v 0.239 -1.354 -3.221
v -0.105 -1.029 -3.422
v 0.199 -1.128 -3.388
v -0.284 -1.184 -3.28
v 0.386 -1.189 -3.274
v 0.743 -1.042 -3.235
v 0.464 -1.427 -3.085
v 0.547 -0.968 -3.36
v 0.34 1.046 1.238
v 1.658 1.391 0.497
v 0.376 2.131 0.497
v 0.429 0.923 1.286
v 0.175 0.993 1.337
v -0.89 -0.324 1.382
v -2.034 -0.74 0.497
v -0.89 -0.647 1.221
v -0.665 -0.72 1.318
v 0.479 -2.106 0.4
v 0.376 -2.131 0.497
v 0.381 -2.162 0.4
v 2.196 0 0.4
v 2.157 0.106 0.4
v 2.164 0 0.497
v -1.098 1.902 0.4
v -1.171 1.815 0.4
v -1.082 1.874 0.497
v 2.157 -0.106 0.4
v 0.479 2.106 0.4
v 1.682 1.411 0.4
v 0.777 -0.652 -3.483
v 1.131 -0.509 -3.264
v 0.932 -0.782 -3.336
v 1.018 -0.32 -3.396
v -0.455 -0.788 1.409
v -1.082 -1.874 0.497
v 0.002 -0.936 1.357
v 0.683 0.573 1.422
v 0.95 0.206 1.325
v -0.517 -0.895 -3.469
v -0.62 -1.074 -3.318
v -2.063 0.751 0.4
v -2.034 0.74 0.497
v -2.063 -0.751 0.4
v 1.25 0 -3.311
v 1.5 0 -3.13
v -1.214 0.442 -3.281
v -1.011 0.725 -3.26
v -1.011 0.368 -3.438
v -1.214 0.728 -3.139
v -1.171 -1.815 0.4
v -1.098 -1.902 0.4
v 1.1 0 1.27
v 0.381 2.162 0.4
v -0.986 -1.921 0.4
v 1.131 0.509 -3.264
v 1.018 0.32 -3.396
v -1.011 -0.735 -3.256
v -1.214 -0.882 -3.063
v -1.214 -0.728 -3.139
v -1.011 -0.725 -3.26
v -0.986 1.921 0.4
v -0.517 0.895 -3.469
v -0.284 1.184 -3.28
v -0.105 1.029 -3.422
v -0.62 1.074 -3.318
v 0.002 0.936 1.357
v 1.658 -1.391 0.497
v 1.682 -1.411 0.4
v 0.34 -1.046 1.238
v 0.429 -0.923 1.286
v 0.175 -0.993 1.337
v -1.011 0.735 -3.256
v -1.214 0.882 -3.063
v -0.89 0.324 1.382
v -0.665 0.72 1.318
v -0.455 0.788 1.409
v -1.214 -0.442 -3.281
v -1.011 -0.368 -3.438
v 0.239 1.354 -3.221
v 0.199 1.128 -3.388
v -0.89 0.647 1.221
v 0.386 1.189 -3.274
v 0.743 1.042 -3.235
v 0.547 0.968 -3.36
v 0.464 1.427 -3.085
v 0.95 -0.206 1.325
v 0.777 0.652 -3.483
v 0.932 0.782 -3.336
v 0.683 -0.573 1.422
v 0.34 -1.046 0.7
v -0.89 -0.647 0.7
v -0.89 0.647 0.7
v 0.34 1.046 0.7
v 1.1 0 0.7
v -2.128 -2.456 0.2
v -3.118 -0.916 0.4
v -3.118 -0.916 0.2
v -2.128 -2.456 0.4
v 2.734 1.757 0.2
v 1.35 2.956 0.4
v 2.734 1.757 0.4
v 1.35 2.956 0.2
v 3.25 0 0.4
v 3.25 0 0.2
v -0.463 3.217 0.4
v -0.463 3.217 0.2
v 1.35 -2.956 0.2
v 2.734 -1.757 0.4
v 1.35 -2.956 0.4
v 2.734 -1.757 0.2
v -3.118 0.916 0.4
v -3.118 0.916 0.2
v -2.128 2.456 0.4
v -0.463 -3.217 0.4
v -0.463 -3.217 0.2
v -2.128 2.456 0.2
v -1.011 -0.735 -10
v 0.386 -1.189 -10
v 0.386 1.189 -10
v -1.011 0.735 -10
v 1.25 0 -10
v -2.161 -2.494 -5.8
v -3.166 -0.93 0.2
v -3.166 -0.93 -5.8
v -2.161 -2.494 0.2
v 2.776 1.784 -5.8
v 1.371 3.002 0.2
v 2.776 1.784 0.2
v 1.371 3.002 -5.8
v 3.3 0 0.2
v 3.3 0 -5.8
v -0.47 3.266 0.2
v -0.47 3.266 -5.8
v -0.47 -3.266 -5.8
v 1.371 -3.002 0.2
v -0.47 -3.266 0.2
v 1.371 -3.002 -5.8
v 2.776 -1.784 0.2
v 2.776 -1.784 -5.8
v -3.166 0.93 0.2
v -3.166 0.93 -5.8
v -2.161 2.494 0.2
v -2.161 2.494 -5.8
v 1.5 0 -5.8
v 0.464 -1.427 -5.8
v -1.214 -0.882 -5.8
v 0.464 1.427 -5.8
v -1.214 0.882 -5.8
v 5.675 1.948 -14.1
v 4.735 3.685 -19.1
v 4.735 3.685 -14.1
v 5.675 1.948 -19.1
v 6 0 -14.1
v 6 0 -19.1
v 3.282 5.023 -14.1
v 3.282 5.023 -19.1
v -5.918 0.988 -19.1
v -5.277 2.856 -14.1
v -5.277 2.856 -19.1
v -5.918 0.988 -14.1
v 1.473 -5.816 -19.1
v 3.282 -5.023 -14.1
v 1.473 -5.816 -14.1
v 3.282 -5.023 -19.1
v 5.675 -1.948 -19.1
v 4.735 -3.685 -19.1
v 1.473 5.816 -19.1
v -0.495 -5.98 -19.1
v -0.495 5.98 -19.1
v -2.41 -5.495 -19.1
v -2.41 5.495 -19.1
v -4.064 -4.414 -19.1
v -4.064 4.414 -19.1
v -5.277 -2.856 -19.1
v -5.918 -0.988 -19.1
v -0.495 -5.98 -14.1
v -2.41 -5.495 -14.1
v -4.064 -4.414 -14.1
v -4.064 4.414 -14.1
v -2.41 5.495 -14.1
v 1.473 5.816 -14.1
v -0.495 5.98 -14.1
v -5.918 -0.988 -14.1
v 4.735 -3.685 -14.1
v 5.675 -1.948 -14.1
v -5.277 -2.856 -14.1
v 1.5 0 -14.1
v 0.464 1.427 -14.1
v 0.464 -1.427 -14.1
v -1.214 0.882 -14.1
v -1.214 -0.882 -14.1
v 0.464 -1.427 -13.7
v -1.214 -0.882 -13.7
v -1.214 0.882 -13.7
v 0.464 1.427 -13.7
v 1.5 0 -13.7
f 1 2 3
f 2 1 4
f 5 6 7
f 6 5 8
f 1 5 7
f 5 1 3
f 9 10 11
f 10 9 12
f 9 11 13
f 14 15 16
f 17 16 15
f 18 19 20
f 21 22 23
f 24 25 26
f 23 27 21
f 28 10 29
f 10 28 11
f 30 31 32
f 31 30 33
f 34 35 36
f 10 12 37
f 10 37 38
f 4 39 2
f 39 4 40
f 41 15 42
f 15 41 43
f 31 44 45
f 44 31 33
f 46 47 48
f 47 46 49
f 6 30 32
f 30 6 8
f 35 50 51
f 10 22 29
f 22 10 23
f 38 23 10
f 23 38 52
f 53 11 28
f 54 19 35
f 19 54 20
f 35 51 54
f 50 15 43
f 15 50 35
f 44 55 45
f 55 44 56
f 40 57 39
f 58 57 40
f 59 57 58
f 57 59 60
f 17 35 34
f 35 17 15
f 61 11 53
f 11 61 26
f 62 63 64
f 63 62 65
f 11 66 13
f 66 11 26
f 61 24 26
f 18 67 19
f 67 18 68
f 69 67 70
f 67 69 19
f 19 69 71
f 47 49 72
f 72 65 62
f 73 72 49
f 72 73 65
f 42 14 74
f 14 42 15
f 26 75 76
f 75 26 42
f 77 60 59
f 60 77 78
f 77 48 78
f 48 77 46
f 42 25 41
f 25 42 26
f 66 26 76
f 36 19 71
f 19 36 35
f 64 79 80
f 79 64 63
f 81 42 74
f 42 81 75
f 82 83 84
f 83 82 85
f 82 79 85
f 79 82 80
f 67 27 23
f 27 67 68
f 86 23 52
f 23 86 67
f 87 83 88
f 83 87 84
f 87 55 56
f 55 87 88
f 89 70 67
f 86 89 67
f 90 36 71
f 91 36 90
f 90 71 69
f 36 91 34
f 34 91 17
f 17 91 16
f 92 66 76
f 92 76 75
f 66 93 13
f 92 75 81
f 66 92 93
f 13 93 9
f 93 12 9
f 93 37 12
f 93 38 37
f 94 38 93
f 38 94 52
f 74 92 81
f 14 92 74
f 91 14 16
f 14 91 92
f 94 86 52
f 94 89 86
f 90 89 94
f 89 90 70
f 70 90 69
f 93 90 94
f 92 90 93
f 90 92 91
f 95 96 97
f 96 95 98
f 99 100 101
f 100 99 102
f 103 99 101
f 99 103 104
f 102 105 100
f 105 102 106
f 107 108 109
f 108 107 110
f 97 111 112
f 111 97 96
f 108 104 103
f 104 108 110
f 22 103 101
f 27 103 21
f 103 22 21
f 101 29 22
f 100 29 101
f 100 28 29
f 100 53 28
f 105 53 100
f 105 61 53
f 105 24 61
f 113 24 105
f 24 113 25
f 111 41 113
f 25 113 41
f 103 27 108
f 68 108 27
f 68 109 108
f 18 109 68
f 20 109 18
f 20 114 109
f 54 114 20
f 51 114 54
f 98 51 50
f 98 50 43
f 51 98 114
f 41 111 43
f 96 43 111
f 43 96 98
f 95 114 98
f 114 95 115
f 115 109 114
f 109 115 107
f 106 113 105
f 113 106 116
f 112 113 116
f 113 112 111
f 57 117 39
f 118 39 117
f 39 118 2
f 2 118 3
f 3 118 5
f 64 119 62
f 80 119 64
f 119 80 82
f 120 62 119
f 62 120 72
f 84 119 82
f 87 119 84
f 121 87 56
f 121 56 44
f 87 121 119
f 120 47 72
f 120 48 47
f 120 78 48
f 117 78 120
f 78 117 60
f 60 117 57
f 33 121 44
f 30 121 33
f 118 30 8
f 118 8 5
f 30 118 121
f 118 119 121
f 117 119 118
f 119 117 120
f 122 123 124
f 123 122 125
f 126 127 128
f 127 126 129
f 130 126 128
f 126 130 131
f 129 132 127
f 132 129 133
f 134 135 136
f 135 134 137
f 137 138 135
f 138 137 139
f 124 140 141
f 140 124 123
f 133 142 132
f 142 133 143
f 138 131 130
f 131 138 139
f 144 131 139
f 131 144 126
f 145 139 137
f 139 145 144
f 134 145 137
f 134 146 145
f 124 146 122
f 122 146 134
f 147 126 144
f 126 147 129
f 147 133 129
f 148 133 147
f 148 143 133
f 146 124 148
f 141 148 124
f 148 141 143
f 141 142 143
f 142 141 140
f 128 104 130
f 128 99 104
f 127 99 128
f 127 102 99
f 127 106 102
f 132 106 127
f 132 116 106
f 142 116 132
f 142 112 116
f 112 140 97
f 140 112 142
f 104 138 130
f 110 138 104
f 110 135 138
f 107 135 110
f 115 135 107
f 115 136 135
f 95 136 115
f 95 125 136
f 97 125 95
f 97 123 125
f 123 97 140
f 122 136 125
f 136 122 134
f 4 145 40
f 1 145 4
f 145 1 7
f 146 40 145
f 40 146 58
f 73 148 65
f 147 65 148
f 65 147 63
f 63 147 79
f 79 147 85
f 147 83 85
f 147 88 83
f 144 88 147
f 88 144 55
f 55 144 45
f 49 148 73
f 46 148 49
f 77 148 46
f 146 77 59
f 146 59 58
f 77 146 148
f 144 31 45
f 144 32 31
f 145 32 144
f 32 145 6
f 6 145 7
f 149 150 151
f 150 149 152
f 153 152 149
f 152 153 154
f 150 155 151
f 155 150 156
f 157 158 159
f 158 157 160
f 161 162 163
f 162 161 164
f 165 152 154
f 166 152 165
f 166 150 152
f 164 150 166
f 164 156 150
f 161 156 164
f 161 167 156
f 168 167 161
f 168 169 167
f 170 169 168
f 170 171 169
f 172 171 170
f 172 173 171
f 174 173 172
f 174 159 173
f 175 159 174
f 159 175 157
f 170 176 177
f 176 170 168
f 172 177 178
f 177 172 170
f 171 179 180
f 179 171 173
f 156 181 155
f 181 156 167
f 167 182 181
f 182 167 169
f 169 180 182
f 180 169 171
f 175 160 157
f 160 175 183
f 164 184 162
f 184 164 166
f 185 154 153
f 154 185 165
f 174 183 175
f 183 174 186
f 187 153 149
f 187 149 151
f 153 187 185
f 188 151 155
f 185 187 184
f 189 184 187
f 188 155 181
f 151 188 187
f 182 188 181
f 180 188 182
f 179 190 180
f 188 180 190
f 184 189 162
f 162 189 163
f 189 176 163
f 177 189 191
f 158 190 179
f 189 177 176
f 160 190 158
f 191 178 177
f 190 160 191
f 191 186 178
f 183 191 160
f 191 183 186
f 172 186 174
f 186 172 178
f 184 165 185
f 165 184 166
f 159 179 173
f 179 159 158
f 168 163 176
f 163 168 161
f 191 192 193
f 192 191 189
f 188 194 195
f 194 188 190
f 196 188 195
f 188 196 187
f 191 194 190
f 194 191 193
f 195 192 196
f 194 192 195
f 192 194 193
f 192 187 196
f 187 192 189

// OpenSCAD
// Parameters
thread_diameter = 2.5; //[1.25:5:0.05]
shaft_length = 10; //[5:20:0.1]
head_diameter = 5.35; //[2.675:10.7:0.05]
head_height = 1.6; //[0.8:3.2:0.05]
transition_height = 0.6; //[0.3:1.2:0.05]
overlap = 0.8; //[0.5:2:0.1]
drive_recess_diameter = 2.2; //[1.2:4:0.05]
drive_recess_depth = 0.9; //[0.4:1.4:0.05]
washer_outer_diameter = 6.5; //[3.25:13:0.1]
washer_thickness = 0.6; //[0.3:1.2:0.05]
washer_hole_diameter = 2.8; //[1.6:5.6:0.05]
spacer_height = 6; //[3:12:0.1]
spacer_wall = 1.8; //[0.9:3.6:0.1]
spacer_inner_diameter = 3; //[2.6:4.5:0.05]
buzzer_diameter = 12; //[6:24:0.5]
buzzer_height = 5; //[2.5:10:0.1]
buzzer_stem_diameter = 3; //[1.5:6:0.1]
buzzer_stem_height = 2; //[1:4:0.1]

// PCB Spacer - complete geometry
module pcb_spacer() {
  color([0.85, 0.85, 0.8]) {
    difference() {
      cylinder(r=spacer_inner_diameter/2 + spacer_wall, h=spacer_height, center=true);
      translate([0, 0, -overlap])
        cylinder(r=spacer_inner_diameter/2, h=spacer_height + overlap*2, center=true);
    }
  }
}

// Screw and Washer - complete geometry
module screw_and_washer() {
  color("DimGray") {
    union() {
      // Threaded Shaft
      translate([0, 0, -shaft_length/2])
        cylinder(r=thread_diameter/2, h=shaft_length, center=true);
      
      // Dome Head
      difference() {
        union() {
          // Head Intersection
          intersection() {
            translate([0, 0, head_height - head_diameter/2])
              sphere(r=head_diameter/2, center=true);
            translate([0, 0, head_height - head_diameter])
              cube([head_diameter*2, head_diameter*2, head_diameter*2], center=true);
          }
          // Head Transition Chamfer
          translate([0, 0, transition_height/2 - overlap/2])
            cylinder(r1=head_diameter/2, r2=thread_diameter/2, h=transition_height, center=true);
        }
        // Drive Recess Placeholder
        translate([0, 0, head_height - drive_recess_depth/2])
          cylinder(r=drive_recess_diameter/2, h=drive_recess_depth, center=true);
      }
      
      // Washer
      difference() {
        translate([0, 0, -washer_thickness/2 + overlap/2])
          cylinder(r=washer_outer_diameter/2, h=washer_thickness, center=true);
        translate([0, 0, -washer_thickness/2 + overlap/2])
          cylinder(r=washer_hole_diameter/2, h=washer_thickness + overlap*2, center=true);
      }
    }
  }
}

// Buzzer - complete geometry
module buzzer() {
  color([0.1, 0.1, 0.6]) {
    union() {
      // Buzzer Body
      translate([0, 0, -washer_thickness - spacer_height - buzzer_height/2 + overlap])
        cylinder(r=buzzer_diameter/2, h=buzzer_height, center=true);
      
      // Buzzer Stem
      translate([0, 0, -washer_thickness - spacer_height + buzzer_stem_height/2 - overlap])
        cylinder(r=buzzer_stem_diameter/2, h=buzzer_stem_height, center=true);
    }
  }
}

// Assembly
module assembly() {
  screw_and_washer();
  translate([0, 0, -washer_thickness - spacer_height/2 + overlap])
    pcb_spacer();
  translate([0, 0, -washer_thickness - spacer_height - buzzer_height/2 + overlap])
    buzzer();
}

assembly();
